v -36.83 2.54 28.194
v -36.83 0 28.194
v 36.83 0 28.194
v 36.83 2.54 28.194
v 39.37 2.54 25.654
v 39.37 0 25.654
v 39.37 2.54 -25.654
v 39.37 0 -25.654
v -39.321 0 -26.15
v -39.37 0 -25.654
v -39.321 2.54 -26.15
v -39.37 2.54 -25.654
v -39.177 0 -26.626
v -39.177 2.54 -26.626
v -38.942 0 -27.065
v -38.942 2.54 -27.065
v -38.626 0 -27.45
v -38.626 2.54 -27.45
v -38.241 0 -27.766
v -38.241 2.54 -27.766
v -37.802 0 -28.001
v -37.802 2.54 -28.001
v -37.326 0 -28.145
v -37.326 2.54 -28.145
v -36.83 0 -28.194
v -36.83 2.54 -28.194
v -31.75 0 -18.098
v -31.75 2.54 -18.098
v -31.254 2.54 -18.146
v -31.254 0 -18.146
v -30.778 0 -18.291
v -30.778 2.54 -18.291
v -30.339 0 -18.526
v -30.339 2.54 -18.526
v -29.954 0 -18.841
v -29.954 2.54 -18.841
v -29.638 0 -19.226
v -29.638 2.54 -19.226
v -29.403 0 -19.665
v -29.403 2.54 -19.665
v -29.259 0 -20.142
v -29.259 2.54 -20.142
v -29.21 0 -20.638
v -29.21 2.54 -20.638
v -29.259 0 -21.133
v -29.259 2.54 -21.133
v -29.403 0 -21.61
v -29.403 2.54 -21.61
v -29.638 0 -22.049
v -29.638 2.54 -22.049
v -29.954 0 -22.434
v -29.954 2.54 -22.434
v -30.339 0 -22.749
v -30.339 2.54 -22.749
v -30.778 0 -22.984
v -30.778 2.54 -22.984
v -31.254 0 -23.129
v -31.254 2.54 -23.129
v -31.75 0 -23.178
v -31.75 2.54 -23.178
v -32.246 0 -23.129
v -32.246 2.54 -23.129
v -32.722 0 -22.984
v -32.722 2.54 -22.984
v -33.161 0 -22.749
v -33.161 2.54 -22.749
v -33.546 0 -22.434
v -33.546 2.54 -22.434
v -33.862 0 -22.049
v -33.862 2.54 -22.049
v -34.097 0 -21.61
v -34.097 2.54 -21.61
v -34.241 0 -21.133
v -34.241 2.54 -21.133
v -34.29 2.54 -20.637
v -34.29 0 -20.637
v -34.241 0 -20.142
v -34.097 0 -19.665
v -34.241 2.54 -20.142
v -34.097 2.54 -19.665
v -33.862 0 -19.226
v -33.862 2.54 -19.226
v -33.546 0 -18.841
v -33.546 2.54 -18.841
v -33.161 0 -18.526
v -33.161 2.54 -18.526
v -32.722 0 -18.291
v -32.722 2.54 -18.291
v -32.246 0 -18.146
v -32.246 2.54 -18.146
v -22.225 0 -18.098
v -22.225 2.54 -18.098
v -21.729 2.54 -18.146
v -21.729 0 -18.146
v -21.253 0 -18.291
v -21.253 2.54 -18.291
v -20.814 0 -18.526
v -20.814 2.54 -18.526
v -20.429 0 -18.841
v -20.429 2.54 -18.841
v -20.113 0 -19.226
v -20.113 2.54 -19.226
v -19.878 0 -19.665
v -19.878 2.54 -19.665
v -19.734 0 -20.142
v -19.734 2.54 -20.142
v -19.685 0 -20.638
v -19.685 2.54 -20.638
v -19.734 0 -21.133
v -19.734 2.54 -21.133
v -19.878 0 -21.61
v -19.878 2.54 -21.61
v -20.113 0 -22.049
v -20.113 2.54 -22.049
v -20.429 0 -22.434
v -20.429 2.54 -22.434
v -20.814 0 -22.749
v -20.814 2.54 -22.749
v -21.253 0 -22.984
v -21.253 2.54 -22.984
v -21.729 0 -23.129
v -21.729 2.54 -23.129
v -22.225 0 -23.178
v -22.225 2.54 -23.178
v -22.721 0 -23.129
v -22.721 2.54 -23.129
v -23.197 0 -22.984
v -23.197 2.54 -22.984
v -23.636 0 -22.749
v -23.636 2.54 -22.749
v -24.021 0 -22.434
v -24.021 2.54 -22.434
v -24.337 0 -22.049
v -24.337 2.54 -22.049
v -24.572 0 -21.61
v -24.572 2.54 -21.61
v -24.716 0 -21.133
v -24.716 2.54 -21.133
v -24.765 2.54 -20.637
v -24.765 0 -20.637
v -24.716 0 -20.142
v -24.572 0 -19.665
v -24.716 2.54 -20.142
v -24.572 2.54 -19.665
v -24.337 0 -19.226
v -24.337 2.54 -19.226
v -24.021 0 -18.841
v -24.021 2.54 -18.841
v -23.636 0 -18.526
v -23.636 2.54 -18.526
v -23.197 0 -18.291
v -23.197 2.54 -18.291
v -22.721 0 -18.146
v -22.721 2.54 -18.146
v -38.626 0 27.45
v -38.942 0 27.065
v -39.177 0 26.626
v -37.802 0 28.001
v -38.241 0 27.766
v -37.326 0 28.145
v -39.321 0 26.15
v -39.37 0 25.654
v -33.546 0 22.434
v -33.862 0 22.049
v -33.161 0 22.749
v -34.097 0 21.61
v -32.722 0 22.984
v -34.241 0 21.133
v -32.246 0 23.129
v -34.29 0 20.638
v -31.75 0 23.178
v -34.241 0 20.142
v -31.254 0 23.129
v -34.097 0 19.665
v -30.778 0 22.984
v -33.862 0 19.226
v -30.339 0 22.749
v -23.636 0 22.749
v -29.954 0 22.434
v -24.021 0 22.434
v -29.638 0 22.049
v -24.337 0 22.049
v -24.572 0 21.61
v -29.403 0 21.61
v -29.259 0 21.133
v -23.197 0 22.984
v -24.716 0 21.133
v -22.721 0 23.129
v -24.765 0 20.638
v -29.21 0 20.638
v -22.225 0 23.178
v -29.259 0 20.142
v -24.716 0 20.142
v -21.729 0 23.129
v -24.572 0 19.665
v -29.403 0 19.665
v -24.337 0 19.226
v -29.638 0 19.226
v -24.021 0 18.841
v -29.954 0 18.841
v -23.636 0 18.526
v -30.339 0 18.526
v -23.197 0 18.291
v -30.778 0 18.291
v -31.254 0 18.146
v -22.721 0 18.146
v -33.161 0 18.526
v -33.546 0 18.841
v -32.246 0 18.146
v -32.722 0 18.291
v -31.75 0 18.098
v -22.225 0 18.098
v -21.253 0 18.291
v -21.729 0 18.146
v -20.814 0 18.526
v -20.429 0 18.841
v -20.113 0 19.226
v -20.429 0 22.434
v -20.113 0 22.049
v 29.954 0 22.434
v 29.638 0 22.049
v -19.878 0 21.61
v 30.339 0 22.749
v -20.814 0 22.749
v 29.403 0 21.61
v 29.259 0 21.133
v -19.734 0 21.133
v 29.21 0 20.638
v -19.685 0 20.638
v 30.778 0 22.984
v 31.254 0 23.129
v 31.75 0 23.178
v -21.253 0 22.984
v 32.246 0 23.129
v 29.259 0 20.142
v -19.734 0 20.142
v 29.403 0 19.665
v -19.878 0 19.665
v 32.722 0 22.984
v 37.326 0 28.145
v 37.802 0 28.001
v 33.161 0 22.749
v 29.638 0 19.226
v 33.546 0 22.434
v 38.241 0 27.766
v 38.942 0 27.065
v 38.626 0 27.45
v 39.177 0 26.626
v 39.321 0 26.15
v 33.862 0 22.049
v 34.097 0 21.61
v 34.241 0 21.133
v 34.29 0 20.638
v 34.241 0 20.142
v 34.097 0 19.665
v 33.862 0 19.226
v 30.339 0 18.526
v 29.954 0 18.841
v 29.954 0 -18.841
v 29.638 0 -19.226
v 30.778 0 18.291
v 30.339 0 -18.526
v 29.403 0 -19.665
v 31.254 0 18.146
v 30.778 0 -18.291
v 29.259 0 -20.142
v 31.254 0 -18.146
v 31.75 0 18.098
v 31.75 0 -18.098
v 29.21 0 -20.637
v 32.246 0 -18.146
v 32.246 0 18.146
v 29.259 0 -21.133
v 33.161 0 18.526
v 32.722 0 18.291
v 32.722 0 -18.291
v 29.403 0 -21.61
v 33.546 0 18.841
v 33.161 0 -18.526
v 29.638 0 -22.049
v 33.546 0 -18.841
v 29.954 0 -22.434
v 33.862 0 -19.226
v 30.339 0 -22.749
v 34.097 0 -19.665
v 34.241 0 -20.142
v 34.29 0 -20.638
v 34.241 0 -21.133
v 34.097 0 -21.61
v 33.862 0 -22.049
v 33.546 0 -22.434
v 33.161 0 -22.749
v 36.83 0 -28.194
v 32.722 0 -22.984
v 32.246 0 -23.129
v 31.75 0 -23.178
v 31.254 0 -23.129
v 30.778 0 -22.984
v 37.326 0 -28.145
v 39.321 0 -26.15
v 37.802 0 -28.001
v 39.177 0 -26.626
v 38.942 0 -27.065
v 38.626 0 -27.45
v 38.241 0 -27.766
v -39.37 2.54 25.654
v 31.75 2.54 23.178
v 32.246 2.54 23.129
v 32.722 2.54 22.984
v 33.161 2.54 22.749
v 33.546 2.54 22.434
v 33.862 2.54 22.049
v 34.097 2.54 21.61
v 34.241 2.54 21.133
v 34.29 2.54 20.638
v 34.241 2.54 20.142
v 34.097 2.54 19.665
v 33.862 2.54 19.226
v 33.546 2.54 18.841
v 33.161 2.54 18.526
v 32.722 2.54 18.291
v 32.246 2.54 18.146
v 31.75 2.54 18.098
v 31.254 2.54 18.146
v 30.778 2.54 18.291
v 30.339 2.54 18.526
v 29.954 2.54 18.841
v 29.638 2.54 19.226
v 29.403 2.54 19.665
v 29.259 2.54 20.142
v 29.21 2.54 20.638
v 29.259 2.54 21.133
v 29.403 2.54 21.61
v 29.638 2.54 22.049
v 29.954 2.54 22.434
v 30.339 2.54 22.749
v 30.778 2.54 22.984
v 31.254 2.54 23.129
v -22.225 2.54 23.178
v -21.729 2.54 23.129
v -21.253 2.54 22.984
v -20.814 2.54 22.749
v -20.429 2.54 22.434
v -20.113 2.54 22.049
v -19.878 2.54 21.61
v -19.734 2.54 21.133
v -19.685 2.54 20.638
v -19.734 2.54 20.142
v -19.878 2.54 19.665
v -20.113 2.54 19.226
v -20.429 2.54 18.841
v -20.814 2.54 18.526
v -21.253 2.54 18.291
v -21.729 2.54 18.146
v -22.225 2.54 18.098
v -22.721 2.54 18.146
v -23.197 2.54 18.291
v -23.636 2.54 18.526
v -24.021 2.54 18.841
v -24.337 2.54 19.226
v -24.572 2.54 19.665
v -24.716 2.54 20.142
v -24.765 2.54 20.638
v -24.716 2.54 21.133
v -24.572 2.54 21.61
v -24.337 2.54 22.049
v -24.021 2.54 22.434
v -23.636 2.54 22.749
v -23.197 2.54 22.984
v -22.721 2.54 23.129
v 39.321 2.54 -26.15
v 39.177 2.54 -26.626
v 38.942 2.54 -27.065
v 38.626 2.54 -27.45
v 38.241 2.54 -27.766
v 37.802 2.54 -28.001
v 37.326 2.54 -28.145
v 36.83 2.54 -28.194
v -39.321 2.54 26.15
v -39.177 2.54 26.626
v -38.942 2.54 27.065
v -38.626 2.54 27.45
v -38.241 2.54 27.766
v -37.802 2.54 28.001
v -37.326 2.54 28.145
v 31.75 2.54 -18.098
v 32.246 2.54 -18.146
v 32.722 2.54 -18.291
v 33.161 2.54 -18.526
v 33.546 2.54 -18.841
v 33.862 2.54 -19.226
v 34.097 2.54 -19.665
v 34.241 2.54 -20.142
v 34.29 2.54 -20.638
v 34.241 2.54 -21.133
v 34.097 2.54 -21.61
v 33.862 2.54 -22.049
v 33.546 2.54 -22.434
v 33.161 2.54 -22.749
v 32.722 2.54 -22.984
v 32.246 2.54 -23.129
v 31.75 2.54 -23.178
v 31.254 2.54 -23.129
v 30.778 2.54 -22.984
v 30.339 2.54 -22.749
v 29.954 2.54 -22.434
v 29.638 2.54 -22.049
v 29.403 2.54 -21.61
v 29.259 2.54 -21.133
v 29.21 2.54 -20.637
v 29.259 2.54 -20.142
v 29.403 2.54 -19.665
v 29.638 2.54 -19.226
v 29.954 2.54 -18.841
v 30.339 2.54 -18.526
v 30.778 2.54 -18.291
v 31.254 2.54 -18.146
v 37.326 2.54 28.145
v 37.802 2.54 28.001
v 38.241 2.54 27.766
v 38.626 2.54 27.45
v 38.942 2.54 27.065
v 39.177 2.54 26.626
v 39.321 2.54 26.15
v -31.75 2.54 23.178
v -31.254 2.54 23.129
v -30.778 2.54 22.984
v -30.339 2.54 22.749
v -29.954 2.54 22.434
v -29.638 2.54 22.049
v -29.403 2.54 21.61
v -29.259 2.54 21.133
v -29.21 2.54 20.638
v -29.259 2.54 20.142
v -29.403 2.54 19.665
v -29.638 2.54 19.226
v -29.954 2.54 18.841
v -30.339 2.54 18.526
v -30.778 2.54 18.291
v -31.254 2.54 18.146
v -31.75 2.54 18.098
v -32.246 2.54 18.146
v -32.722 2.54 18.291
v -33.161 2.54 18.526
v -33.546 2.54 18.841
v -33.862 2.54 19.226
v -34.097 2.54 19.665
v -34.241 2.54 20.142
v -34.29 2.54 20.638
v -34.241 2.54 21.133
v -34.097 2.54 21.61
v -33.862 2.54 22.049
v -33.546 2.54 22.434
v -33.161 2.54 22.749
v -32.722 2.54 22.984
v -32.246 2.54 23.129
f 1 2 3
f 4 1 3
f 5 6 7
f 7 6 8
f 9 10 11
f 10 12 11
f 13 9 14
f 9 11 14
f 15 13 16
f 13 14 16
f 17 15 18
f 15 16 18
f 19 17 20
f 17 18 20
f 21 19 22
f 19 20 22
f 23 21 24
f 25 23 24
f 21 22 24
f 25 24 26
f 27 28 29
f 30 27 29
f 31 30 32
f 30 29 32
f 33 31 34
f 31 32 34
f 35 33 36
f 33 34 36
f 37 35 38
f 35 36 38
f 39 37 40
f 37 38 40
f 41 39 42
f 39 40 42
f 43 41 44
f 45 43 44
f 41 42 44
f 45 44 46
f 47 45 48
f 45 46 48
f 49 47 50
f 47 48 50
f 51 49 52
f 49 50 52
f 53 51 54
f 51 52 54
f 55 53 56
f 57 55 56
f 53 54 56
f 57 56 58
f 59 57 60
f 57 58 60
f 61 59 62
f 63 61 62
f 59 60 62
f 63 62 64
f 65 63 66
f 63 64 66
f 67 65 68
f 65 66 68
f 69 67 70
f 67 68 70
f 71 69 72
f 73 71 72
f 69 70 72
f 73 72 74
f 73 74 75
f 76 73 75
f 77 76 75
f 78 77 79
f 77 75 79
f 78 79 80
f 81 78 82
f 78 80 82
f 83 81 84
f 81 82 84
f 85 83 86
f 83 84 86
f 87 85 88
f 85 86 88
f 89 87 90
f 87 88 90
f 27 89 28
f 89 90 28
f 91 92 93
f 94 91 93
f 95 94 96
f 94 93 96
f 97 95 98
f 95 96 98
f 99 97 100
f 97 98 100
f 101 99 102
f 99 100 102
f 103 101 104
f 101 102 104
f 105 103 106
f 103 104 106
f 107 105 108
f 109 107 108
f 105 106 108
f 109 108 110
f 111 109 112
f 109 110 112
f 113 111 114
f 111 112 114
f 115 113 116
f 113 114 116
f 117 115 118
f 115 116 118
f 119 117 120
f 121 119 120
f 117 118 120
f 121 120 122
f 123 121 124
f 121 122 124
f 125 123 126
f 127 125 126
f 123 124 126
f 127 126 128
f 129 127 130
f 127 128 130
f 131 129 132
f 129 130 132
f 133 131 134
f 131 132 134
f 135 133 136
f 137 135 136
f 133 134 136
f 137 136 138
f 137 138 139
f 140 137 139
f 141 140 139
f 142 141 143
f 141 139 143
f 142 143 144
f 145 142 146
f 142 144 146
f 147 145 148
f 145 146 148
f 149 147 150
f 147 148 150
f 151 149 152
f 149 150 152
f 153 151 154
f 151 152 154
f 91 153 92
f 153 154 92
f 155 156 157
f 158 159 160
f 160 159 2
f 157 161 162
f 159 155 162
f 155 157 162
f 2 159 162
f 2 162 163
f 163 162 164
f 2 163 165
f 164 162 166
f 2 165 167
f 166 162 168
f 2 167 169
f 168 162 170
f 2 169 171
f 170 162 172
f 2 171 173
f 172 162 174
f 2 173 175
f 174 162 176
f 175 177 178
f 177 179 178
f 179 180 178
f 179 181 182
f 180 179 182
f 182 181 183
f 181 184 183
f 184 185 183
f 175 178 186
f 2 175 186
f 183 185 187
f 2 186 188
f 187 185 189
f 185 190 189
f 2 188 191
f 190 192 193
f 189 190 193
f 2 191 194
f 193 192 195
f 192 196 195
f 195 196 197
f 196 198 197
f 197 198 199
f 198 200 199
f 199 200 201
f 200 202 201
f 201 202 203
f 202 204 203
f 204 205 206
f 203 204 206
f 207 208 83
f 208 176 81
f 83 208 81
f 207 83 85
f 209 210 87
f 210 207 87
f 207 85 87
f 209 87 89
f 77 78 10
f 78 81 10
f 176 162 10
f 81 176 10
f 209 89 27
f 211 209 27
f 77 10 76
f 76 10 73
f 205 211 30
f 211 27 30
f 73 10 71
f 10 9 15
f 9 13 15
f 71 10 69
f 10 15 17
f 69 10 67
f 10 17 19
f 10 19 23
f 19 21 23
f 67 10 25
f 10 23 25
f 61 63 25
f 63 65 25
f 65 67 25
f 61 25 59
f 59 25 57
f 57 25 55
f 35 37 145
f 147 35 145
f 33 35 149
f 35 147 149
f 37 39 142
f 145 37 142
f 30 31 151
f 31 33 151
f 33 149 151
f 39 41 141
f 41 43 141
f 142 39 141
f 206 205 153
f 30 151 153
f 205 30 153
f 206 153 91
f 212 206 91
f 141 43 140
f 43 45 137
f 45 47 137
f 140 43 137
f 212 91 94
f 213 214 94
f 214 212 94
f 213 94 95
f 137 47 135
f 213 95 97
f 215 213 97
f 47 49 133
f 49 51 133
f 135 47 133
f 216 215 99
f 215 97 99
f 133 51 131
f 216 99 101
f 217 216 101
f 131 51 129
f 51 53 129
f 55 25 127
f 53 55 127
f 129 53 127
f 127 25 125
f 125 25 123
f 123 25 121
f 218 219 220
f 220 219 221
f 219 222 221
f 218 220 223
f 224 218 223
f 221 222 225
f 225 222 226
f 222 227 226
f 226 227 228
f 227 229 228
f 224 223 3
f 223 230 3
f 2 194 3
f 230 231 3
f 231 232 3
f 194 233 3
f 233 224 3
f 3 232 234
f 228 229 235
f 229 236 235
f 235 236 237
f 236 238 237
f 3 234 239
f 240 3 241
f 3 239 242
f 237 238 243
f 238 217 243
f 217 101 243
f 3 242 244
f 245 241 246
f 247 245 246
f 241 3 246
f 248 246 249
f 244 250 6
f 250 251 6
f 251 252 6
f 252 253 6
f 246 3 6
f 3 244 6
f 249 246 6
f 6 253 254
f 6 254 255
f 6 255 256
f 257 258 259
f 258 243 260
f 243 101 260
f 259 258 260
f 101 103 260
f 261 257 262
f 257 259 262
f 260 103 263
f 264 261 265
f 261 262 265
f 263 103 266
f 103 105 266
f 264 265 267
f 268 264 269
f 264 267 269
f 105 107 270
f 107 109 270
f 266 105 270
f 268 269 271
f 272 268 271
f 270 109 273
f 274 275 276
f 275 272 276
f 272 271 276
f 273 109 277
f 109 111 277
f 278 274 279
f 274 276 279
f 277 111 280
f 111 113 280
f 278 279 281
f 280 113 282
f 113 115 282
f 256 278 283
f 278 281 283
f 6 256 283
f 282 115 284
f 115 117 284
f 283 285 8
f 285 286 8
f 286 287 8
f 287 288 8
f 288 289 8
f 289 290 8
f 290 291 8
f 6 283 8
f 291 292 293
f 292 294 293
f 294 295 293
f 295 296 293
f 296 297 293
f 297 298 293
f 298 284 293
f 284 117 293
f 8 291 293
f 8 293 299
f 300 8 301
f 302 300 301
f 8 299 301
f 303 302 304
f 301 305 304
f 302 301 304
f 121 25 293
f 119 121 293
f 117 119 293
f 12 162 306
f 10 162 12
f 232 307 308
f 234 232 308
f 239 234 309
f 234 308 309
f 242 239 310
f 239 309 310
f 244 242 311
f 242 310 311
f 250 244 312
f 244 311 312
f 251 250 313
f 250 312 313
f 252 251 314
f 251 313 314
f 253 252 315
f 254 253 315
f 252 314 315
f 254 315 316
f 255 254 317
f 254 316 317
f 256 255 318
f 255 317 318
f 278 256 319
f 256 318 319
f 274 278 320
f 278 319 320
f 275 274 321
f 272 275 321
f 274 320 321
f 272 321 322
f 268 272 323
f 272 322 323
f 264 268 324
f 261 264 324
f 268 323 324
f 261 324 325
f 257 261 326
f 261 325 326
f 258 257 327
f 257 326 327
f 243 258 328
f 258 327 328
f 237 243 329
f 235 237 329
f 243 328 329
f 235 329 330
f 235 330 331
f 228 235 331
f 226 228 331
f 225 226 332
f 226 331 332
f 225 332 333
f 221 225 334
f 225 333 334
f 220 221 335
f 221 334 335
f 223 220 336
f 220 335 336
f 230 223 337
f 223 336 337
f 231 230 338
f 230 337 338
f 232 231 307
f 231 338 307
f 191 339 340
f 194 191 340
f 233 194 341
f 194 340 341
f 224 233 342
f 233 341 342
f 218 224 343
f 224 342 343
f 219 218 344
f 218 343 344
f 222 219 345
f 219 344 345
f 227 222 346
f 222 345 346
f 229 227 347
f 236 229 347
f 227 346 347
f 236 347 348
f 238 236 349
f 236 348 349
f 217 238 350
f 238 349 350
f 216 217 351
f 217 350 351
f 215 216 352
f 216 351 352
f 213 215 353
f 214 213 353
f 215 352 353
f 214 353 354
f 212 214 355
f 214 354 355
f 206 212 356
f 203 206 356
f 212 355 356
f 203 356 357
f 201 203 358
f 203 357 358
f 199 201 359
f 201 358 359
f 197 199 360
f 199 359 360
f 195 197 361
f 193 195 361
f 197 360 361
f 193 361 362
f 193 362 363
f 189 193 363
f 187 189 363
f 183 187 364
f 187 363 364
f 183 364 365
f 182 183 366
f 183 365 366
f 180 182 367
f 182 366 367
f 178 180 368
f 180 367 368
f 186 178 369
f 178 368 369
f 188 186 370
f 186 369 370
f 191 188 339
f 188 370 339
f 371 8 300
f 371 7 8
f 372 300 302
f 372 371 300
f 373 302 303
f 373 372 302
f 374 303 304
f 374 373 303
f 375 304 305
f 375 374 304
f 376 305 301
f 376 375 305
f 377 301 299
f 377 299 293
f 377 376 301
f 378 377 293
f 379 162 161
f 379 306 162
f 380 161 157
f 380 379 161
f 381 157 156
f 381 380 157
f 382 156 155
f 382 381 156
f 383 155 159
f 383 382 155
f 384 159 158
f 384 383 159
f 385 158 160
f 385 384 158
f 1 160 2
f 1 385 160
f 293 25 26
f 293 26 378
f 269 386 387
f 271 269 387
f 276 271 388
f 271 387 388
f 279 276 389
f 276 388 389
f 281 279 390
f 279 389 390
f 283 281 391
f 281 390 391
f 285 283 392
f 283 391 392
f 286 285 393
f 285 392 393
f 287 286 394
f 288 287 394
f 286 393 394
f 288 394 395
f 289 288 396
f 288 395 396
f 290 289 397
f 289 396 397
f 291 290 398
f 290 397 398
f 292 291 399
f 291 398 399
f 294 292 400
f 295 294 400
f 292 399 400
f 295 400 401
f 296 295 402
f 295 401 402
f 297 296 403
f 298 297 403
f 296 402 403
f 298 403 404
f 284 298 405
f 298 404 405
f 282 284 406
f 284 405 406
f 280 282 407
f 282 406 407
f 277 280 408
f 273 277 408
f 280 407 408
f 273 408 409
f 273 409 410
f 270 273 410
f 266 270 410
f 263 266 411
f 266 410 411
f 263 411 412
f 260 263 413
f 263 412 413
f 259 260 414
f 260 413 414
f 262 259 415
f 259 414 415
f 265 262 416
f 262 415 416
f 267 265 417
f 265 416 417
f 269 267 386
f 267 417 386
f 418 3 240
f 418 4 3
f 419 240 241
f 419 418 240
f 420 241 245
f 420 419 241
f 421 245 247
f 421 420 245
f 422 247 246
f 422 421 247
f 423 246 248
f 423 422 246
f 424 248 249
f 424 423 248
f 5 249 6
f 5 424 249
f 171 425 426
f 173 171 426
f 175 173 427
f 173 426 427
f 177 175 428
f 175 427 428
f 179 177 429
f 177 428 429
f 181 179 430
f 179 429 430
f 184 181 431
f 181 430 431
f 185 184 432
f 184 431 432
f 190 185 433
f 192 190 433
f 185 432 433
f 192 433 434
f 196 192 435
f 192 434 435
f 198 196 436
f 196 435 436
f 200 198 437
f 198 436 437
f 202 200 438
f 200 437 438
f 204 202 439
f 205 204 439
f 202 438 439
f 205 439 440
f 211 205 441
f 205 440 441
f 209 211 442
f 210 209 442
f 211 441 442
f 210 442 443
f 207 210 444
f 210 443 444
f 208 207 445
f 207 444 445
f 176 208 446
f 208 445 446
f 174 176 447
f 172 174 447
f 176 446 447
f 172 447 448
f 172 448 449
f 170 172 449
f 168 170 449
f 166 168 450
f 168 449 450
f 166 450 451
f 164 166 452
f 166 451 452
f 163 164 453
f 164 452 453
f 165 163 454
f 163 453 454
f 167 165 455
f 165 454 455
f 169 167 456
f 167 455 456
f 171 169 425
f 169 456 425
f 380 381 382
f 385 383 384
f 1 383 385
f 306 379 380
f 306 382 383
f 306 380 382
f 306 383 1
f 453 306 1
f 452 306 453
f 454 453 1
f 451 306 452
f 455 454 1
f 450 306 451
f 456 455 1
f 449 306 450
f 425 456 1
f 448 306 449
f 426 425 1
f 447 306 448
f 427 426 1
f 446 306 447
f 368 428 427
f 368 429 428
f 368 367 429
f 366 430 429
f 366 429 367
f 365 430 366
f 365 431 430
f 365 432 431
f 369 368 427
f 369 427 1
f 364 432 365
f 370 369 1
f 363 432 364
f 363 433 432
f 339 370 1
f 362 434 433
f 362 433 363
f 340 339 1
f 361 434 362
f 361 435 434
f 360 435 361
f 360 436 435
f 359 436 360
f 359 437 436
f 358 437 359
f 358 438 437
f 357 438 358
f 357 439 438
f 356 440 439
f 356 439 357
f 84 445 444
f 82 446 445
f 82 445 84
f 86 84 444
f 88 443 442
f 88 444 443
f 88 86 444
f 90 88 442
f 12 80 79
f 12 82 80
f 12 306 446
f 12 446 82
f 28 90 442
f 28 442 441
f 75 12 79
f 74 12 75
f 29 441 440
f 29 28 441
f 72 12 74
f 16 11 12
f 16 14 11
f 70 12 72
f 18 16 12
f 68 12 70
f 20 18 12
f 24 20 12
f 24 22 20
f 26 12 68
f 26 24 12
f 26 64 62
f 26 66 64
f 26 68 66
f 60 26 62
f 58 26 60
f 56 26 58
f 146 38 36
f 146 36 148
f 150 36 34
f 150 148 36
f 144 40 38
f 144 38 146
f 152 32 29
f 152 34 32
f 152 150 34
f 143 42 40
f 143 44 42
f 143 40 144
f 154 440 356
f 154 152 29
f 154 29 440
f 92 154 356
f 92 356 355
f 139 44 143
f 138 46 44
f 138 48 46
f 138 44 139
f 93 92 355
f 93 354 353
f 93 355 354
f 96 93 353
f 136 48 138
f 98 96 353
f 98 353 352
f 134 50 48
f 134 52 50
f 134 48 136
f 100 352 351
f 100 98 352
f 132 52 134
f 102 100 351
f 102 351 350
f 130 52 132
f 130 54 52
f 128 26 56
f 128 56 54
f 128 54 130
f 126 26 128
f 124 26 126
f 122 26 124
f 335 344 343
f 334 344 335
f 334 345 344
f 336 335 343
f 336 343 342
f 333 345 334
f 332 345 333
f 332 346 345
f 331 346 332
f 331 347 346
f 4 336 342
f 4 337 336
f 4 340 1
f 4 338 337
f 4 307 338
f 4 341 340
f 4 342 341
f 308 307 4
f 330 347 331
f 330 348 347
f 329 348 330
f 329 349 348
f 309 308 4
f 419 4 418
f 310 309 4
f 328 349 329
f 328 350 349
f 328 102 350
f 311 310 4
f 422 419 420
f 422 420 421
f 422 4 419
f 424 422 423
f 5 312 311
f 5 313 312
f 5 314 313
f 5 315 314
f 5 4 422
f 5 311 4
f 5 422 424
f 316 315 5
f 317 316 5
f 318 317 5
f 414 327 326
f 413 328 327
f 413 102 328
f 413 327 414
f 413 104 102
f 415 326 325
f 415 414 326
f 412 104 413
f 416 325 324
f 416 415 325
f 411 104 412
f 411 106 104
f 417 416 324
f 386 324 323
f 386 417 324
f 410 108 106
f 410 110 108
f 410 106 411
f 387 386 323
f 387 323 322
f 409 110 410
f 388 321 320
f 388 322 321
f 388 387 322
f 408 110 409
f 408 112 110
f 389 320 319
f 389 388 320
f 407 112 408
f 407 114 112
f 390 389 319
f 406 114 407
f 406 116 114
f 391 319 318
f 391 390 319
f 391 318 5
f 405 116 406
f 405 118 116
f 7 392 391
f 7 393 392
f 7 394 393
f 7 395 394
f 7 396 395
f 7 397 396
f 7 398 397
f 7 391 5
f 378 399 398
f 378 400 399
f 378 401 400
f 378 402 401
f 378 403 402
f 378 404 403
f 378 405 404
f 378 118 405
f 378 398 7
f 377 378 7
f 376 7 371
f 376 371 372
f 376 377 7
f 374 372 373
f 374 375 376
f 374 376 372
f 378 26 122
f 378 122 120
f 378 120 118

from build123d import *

# Parameters (mm, degrees)
SKETCH1_W           = 78.74
SKETCH1_H           = 56.388
BOSS_EXTRUDE1_DEPTH = 2.54
FILLET1_R           = 2.54
SKETCH2_R           = 2.54
CUT_EXTRUDE1_DEPTH  = 2.54


with BuildPart() as part:
    # Sketch1 → Boss-Extrude1 (new body)
    with BuildSketch(Plane(origin=(0, 0, 0), x_dir=(1, 0, 0), z_dir=(0, 1, 0))):
        Rectangle(SKETCH1_W, SKETCH1_H)
    extrude(amount=BOSS_EXTRUDE1_DEPTH)

    # Fillet1
    fillet1_edges = [part.edges().sort_by_distance(p)[0] for p in [
        (39.37, 1.27, 28.194),
        (-39.37, 1.27, 28.194),
        (-39.37, 1.27, -28.194),
        (39.37, 1.27, -28.194),
    ]]
    fillet(fillet1_edges, radius=FILLET1_R)

    # Sketch2 → Cut-Extrude1 (cut)
    with BuildSketch(Plane(origin=(0, 2.54, 0), x_dir=(1, 0, 0), z_dir=(0, 1, 0))):
        with Locations(Location((31.75, 20.6375, 0), (0, 0, 270))):
            Circle(SKETCH2_R)
        with Locations(Location((31.75, -20.6375, 0), (0, 0, 270))):
            Circle(SKETCH2_R)
        with Locations(Location((-31.75, -20.6375, 0), (0, 0, 270))):
            Circle(SKETCH2_R)
        with Locations(Location((-31.75, 20.6375, 0), (0, 0, 270))):
            Circle(SKETCH2_R)
        with Locations(Location((-22.225, -20.6375, 0), (0, 0, 270))):
            Circle(SKETCH2_R)
        with Locations(Location((-22.225, 20.6375, 0), (0, 0, 270))):
            Circle(SKETCH2_R)
    extrude(amount=-CUT_EXTRUDE1_DEPTH, mode=Mode.SUBTRACT)


solid = part.part
